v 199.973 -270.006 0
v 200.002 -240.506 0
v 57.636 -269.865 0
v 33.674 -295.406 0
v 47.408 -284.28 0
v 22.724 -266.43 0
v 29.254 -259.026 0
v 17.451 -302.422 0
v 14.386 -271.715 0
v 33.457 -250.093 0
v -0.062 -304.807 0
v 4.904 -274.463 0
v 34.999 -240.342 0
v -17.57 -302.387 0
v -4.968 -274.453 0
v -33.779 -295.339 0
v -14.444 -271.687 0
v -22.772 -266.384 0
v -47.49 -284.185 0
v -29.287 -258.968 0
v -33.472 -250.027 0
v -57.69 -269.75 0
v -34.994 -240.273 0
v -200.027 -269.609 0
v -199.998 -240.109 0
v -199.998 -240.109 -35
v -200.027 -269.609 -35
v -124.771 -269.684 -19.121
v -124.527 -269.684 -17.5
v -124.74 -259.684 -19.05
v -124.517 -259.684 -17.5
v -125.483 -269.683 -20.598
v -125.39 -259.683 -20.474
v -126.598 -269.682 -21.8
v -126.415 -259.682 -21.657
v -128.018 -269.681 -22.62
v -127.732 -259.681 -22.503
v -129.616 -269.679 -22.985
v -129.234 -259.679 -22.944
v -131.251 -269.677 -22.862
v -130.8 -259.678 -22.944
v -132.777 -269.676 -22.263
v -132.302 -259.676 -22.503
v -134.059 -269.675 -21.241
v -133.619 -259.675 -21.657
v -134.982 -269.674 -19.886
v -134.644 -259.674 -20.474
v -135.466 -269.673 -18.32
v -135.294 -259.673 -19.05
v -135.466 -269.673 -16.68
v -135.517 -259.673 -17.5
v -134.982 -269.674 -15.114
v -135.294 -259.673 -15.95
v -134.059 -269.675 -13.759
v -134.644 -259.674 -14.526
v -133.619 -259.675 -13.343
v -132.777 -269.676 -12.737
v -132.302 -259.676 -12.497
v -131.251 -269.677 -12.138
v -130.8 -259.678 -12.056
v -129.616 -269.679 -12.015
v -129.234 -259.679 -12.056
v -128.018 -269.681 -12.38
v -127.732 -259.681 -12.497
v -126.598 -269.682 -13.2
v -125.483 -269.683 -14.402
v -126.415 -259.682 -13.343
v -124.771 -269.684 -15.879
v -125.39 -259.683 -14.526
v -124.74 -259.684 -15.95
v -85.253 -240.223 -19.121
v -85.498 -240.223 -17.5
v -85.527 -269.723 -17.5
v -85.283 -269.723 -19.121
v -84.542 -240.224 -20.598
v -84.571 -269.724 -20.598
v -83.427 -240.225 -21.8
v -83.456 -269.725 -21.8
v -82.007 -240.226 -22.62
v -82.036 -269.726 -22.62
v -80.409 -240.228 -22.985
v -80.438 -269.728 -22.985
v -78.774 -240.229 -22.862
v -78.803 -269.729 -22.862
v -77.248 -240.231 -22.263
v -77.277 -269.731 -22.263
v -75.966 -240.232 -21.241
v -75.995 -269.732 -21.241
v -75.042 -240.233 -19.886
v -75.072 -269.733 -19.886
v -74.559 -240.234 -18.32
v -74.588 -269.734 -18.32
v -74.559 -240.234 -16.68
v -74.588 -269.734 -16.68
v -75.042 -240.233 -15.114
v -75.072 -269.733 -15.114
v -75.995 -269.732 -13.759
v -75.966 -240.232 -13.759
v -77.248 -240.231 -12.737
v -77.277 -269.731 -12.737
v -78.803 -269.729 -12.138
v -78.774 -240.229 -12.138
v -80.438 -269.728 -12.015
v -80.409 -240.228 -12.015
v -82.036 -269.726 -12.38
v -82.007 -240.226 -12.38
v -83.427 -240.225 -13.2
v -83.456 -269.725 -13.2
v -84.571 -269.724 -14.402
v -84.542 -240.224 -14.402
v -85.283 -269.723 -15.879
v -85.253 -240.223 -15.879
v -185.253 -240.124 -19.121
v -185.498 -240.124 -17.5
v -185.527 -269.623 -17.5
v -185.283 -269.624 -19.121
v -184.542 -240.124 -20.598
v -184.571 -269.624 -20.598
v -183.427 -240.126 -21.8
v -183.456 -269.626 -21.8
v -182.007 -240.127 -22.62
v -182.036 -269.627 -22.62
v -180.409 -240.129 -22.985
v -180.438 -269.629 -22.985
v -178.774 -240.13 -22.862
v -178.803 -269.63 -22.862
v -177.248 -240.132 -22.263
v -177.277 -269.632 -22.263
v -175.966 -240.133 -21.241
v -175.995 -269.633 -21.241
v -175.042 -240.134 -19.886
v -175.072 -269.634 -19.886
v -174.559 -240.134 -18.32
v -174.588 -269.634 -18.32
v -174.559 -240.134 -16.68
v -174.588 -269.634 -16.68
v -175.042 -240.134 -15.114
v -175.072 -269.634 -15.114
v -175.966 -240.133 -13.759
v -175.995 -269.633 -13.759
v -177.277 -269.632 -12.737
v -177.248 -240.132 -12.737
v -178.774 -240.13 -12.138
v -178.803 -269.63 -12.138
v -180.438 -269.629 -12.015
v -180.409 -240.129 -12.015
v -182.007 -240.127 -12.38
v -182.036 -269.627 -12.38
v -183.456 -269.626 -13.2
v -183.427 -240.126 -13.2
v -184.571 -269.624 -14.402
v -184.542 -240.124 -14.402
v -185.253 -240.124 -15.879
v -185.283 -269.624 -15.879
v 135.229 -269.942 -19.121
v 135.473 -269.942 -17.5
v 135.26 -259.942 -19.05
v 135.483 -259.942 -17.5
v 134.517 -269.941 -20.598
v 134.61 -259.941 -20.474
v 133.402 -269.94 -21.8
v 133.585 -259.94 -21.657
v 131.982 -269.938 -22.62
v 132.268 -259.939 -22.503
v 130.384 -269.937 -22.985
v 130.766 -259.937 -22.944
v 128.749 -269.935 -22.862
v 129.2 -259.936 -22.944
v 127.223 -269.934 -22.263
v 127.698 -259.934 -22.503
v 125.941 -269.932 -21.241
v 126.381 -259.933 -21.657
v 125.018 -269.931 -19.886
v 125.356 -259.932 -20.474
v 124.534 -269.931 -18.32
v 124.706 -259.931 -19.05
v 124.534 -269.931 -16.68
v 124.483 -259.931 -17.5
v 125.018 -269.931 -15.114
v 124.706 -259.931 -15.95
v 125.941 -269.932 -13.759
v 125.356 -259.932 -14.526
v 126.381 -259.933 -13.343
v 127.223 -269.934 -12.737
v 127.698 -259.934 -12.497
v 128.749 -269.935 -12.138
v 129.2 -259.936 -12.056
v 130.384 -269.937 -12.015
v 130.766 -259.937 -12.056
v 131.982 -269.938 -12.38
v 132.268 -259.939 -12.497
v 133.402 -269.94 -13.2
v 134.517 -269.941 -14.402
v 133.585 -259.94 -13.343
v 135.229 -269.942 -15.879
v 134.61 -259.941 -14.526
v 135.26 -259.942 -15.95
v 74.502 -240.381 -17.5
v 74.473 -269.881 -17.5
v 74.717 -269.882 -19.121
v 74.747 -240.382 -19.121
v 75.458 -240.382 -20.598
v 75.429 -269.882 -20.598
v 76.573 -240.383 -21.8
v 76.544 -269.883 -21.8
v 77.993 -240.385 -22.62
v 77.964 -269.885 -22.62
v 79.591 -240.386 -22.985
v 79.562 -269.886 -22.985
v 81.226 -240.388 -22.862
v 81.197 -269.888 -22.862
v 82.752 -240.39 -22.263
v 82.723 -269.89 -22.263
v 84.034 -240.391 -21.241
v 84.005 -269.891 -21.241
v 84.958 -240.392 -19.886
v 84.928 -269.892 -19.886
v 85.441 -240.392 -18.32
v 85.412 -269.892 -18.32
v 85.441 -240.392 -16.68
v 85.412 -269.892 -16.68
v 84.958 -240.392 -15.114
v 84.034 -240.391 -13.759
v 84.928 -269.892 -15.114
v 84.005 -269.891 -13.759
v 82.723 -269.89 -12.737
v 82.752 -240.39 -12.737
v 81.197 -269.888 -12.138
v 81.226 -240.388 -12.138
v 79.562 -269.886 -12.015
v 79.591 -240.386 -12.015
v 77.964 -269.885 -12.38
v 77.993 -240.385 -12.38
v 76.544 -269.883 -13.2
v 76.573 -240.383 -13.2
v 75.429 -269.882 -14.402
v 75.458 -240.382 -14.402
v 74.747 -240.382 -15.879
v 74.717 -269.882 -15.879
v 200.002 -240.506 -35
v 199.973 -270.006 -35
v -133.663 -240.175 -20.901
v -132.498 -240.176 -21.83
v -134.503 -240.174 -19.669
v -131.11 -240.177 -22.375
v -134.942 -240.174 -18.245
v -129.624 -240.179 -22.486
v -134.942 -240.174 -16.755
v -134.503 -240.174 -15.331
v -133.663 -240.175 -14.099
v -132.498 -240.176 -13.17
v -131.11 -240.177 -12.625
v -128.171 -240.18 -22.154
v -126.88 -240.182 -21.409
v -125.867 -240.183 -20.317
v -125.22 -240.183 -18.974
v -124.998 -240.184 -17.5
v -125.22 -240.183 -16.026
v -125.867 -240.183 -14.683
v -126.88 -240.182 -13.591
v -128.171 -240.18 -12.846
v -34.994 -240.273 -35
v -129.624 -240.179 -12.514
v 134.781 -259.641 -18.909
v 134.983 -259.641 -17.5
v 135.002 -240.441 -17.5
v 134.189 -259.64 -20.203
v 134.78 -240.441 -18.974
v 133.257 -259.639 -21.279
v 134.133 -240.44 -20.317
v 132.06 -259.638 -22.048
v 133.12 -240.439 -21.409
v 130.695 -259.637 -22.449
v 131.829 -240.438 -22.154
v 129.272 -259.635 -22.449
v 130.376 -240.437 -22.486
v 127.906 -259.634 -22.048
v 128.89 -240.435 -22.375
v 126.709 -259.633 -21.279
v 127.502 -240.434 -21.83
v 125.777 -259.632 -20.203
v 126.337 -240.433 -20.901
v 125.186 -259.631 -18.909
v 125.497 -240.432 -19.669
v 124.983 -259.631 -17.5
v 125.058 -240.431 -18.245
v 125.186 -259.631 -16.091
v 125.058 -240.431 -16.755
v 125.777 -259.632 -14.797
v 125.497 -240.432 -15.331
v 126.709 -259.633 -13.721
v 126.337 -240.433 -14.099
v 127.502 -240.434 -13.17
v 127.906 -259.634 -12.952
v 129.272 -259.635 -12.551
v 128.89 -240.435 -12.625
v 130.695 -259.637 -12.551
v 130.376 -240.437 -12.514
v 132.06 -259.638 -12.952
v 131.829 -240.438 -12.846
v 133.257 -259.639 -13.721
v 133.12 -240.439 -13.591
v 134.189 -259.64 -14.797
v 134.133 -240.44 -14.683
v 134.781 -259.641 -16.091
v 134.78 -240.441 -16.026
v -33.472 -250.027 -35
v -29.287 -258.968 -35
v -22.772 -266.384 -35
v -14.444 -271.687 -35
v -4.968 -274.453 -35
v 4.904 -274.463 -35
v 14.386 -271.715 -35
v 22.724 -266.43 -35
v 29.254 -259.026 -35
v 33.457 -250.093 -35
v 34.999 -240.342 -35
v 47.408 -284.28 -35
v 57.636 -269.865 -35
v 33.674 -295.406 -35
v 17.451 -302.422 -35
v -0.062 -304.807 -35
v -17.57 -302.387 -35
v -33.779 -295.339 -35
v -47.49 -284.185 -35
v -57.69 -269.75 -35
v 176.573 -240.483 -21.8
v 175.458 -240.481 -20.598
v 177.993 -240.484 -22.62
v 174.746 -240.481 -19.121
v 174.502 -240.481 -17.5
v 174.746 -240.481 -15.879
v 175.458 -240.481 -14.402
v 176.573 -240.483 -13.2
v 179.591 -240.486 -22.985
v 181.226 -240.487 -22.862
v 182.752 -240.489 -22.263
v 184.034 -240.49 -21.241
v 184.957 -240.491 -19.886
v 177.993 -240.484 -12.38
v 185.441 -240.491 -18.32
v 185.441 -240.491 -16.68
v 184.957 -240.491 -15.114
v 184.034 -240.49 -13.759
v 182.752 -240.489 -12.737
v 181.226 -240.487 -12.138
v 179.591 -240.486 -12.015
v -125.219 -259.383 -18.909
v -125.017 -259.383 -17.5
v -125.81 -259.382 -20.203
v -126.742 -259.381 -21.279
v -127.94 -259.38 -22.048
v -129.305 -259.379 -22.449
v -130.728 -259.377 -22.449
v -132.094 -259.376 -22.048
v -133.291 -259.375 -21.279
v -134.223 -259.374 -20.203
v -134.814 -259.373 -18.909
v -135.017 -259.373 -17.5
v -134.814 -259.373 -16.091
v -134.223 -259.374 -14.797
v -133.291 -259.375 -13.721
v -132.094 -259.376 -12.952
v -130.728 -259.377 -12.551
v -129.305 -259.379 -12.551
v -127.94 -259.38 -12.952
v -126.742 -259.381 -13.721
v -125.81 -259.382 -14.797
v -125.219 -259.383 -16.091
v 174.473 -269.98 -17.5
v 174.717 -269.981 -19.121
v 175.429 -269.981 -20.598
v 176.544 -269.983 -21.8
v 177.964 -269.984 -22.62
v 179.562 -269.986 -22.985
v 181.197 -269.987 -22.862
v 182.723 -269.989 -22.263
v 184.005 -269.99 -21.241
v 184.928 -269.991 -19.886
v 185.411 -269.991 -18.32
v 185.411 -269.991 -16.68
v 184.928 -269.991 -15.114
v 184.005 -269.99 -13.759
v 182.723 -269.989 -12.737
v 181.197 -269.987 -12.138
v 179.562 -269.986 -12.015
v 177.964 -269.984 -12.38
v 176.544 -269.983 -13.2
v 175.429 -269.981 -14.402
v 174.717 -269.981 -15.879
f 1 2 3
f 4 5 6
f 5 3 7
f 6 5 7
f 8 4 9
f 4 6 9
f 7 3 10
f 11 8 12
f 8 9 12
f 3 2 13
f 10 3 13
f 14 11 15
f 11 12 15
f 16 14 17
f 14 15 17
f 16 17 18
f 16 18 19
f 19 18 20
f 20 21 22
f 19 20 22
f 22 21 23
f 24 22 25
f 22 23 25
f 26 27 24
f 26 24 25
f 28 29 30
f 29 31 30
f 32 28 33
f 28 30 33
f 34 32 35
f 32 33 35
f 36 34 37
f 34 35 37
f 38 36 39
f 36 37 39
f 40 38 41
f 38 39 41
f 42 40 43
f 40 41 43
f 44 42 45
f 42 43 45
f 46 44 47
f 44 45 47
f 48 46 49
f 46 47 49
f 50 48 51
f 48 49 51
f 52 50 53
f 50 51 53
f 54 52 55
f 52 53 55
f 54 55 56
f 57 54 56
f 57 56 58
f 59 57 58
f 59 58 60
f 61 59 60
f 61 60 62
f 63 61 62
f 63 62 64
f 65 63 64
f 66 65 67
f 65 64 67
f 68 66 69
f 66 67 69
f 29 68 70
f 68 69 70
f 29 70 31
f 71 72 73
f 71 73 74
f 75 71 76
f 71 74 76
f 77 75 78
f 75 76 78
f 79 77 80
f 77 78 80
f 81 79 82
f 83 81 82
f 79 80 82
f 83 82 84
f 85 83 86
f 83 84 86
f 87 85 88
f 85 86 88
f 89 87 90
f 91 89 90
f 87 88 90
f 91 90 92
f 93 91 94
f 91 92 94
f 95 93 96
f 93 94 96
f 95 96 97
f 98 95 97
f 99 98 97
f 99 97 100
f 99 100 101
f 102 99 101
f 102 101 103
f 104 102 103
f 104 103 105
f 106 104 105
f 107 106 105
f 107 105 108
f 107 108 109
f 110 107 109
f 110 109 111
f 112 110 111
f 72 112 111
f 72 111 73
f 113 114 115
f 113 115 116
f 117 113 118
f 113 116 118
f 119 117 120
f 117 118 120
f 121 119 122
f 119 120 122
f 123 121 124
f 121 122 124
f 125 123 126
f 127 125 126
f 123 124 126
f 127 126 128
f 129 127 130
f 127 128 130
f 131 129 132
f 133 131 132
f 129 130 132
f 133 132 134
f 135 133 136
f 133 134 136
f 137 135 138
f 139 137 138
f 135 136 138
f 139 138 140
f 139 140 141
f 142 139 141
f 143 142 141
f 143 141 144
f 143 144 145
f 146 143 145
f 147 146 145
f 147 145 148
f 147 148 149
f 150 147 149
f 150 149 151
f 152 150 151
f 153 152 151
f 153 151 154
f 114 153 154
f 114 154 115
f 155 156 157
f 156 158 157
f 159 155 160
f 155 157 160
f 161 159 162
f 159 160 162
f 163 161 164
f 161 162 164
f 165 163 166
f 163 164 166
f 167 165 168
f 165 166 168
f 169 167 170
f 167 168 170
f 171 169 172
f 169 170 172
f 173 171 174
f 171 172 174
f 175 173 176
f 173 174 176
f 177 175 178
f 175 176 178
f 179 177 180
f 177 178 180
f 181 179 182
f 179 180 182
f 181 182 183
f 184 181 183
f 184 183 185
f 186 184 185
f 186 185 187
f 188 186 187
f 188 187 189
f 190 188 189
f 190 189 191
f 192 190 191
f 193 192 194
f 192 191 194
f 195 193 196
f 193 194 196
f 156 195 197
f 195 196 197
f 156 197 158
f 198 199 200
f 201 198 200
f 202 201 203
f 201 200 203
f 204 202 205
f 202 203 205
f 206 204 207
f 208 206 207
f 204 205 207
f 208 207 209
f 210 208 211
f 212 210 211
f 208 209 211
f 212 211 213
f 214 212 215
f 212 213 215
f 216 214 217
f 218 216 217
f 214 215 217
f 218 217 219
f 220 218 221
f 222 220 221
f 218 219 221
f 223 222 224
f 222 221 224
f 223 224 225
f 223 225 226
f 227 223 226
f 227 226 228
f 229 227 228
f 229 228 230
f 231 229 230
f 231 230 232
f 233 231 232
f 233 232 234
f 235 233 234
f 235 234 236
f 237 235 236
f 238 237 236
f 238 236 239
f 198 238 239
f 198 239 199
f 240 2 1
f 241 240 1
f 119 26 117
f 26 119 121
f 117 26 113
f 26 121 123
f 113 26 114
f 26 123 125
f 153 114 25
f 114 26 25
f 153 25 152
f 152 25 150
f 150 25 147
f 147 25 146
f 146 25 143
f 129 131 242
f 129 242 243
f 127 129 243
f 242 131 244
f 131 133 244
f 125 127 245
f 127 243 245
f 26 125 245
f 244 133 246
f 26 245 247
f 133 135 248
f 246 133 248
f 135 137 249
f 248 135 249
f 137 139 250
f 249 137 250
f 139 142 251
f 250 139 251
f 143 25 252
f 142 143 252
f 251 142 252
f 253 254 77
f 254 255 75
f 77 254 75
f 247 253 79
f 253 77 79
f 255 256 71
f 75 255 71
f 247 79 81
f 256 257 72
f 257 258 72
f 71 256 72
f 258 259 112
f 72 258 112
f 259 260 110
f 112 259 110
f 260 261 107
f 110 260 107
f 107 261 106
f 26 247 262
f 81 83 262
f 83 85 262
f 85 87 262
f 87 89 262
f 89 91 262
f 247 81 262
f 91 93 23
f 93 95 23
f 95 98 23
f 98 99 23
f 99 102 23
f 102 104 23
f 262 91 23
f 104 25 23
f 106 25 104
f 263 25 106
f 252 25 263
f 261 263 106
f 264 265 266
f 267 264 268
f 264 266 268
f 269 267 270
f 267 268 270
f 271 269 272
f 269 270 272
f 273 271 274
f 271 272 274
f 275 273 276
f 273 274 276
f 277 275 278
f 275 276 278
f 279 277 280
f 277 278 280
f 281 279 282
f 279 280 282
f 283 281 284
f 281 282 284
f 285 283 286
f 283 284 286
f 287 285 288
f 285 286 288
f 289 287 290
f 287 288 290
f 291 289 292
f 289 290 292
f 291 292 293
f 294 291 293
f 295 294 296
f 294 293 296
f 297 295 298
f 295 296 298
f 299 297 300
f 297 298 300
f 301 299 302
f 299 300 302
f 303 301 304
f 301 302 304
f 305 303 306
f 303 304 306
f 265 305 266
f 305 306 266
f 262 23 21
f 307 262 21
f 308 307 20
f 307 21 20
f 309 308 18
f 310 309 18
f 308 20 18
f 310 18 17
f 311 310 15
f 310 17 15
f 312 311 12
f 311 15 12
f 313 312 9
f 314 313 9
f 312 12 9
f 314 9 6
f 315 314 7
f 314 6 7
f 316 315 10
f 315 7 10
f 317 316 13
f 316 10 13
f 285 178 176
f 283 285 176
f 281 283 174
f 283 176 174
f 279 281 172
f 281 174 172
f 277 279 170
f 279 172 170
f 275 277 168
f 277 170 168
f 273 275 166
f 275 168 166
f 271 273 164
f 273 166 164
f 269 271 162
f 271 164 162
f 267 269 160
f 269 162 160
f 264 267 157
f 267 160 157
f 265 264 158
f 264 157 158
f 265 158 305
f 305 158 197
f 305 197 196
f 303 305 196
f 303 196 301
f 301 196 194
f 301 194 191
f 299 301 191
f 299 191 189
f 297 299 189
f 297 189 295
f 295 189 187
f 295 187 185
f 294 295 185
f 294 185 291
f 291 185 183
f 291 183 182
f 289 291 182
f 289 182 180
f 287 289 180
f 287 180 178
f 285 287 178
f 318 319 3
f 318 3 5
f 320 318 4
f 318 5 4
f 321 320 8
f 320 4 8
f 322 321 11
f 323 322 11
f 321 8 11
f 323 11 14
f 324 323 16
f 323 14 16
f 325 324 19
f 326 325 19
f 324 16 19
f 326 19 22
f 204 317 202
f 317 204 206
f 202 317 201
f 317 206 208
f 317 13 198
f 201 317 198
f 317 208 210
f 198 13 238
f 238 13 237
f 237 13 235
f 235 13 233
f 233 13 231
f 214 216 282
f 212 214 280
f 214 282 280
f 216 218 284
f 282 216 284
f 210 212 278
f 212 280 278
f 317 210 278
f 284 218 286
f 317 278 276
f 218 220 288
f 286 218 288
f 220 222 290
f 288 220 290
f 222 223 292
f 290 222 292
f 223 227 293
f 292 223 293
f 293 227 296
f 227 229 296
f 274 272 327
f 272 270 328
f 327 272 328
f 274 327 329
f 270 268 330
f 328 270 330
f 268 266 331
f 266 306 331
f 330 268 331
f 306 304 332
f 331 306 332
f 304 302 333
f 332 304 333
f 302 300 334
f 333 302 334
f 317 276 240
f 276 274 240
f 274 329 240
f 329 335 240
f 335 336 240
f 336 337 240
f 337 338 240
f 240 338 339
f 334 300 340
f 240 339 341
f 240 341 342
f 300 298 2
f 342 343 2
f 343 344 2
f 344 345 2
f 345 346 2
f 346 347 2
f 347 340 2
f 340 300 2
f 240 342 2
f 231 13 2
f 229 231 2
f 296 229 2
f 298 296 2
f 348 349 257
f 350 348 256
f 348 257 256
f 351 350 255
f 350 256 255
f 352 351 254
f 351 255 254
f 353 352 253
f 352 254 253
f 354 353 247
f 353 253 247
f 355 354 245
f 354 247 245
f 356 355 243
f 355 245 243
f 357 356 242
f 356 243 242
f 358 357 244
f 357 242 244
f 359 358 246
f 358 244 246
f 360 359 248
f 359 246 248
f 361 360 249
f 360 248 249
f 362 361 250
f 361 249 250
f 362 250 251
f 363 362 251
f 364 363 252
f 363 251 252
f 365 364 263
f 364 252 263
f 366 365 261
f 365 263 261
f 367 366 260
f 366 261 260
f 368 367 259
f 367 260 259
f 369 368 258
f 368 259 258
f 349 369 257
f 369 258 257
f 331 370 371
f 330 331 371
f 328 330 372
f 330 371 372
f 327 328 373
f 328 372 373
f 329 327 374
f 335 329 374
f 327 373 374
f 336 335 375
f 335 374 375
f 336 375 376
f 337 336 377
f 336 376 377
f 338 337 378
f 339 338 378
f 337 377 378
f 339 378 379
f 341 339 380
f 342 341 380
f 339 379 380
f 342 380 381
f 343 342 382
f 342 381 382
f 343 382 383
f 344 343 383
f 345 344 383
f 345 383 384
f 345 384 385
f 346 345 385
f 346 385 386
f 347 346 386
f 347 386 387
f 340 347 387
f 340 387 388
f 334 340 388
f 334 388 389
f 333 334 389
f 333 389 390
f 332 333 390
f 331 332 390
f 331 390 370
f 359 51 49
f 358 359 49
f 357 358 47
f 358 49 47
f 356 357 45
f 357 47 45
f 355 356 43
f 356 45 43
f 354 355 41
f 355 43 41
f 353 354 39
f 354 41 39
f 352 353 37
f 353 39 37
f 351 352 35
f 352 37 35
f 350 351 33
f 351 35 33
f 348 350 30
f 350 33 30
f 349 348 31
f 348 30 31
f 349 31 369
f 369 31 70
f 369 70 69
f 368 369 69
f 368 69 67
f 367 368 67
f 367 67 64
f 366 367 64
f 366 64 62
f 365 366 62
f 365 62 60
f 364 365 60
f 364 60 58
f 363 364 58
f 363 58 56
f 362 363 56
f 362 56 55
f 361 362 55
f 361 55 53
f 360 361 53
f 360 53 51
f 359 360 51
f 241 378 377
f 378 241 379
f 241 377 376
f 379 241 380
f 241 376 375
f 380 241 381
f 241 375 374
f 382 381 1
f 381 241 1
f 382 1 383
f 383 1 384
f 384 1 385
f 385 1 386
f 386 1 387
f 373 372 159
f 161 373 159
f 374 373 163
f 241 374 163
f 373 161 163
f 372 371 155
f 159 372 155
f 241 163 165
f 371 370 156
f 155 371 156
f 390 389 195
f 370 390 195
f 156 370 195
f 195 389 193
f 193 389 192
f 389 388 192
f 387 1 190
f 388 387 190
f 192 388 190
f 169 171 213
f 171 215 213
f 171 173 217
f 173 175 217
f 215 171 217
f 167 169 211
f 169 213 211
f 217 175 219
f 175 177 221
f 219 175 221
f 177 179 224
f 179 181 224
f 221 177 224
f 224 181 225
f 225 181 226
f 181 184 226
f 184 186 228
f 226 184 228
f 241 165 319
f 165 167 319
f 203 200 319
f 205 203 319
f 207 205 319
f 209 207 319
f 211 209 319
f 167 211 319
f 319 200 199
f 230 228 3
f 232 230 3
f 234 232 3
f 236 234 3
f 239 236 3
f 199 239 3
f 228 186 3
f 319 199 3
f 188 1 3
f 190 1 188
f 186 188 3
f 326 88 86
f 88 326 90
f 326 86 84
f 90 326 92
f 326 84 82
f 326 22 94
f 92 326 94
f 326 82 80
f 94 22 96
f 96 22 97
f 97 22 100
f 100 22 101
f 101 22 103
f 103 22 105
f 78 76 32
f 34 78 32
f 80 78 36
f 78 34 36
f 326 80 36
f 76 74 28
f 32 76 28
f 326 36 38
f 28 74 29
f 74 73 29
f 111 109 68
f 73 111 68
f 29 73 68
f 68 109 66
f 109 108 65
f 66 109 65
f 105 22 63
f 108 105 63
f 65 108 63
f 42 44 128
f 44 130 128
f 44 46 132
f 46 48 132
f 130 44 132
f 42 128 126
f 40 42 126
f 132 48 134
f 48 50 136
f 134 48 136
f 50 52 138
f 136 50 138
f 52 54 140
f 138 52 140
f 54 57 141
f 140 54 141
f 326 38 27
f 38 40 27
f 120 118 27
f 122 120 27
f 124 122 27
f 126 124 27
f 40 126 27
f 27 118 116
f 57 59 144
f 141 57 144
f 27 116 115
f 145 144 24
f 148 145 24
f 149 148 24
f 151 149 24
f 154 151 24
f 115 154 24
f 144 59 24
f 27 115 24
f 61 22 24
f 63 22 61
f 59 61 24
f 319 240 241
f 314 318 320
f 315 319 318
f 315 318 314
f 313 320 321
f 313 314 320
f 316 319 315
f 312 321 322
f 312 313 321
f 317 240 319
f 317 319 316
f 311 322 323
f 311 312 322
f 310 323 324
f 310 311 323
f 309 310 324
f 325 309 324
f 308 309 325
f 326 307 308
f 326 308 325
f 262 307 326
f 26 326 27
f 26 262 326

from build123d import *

# Parameters (mm, degrees)
RESSALTO_EXTRUS_O1_DEPTH         = 35
FURO_DE_DI_METRO_11_0_11_1_D     = 11
FUROS_GUIA_COM_10_0MM1_D         = 10
FURO_DE_DI_METRO_11_0_11_2_D     = 11
FURO_DE_DI_METRO_11_0_11_2_DEPTH = 10
FURO_DE_DI_METRO_11_0_11_2_TIP   = 3.304733405


with BuildPart() as part:
    # Esboço1 → Ressalto-extrusão1 (new body)
    with BuildSketch(Plane.XY):
        with BuildLine():
            Line((-199.997669575, -240.109131808), (-34.994179097, -240.27276126))
            ThreePointArc((-34.994179097, -240.27276126), (-0.031980607, -274.807449281), (34.998643265, -240.34217123))
            Line((34.998643265, -240.34217123), (200.002133743, -240.505800682))
            Line((200.002133743, -240.505800682), (199.972879413, -270.005786177))
            Line((199.972879413, -270.005786177), (57.635762375, -269.864634348))
            ThreePointArc((57.635762375, -269.864634348), (-0.061730772, -304.80743453), (-57.689806866, -269.750269132))
            Line((-57.689806866, -269.750269132), (-200.026923904, -269.609117302))
            Line((-200.026923904, -269.609117302), (-199.997669575, -240.109131808))
        make_face()
    extrude(amount=-RESSALTO_EXTRUS_O1_DEPTH)

    # Furo de diâmetro Ø11.0 (11)1 (through all)
    with Locations(Plane(origin=(-0.238306111, -240.30722771, 0), x_dir=(0.9999995082930158, -0.000991672187112085, 0), z_dir=(0.000991672187112085, 0.9999995082930158, 0))):
        with Locations((-179.759461687, 17.5), (-79.759461687, 17.5), (80.240538313, 17.5), (180.240538313, 17.5)):
            Hole(FURO_DE_DI_METRO_11_0_11_1_D / 2)

    # Furos-guia com Ø10.0mm1 (through all)
    with Locations(Plane(origin=(-0.267560441, -269.807213205, 0), x_dir=(-0.9999995082930158, 0.0009916721871120312, 0), z_dir=(-0.0009916721871120312, -0.9999995082930158, 0))):
        with Locations((129.759461687, 17.5), (-130.240538313, 17.5), (-221.181262437, -155.418379851)):
            Hole(FUROS_GUIA_COM_10_0MM1_D / 2)

    # Furo de diâmetro Ø11.0 (11)2
    with Locations(Plane(origin=(-0.267560441, -269.807213205, 0), x_dir=(-0.9999995082930158, 0.0009916721871120312, 0), z_dir=(-0.0009916721871120312, -0.9999995082930158, 0))):
        with Locations((129.759461687, 17.5), (-130.240538313, 17.5)):
            Hole(FURO_DE_DI_METRO_11_0_11_2_D / 2, depth=FURO_DE_DI_METRO_11_0_11_2_DEPTH)
            with Locations((0, 0, -(FURO_DE_DI_METRO_11_0_11_2_DEPTH + FURO_DE_DI_METRO_11_0_11_2_TIP / 2))):  # 118° drill point
                Cone(0, FURO_DE_DI_METRO_11_0_11_2_D / 2, FURO_DE_DI_METRO_11_0_11_2_TIP, mode=Mode.SUBTRACT)


solid = part.part
